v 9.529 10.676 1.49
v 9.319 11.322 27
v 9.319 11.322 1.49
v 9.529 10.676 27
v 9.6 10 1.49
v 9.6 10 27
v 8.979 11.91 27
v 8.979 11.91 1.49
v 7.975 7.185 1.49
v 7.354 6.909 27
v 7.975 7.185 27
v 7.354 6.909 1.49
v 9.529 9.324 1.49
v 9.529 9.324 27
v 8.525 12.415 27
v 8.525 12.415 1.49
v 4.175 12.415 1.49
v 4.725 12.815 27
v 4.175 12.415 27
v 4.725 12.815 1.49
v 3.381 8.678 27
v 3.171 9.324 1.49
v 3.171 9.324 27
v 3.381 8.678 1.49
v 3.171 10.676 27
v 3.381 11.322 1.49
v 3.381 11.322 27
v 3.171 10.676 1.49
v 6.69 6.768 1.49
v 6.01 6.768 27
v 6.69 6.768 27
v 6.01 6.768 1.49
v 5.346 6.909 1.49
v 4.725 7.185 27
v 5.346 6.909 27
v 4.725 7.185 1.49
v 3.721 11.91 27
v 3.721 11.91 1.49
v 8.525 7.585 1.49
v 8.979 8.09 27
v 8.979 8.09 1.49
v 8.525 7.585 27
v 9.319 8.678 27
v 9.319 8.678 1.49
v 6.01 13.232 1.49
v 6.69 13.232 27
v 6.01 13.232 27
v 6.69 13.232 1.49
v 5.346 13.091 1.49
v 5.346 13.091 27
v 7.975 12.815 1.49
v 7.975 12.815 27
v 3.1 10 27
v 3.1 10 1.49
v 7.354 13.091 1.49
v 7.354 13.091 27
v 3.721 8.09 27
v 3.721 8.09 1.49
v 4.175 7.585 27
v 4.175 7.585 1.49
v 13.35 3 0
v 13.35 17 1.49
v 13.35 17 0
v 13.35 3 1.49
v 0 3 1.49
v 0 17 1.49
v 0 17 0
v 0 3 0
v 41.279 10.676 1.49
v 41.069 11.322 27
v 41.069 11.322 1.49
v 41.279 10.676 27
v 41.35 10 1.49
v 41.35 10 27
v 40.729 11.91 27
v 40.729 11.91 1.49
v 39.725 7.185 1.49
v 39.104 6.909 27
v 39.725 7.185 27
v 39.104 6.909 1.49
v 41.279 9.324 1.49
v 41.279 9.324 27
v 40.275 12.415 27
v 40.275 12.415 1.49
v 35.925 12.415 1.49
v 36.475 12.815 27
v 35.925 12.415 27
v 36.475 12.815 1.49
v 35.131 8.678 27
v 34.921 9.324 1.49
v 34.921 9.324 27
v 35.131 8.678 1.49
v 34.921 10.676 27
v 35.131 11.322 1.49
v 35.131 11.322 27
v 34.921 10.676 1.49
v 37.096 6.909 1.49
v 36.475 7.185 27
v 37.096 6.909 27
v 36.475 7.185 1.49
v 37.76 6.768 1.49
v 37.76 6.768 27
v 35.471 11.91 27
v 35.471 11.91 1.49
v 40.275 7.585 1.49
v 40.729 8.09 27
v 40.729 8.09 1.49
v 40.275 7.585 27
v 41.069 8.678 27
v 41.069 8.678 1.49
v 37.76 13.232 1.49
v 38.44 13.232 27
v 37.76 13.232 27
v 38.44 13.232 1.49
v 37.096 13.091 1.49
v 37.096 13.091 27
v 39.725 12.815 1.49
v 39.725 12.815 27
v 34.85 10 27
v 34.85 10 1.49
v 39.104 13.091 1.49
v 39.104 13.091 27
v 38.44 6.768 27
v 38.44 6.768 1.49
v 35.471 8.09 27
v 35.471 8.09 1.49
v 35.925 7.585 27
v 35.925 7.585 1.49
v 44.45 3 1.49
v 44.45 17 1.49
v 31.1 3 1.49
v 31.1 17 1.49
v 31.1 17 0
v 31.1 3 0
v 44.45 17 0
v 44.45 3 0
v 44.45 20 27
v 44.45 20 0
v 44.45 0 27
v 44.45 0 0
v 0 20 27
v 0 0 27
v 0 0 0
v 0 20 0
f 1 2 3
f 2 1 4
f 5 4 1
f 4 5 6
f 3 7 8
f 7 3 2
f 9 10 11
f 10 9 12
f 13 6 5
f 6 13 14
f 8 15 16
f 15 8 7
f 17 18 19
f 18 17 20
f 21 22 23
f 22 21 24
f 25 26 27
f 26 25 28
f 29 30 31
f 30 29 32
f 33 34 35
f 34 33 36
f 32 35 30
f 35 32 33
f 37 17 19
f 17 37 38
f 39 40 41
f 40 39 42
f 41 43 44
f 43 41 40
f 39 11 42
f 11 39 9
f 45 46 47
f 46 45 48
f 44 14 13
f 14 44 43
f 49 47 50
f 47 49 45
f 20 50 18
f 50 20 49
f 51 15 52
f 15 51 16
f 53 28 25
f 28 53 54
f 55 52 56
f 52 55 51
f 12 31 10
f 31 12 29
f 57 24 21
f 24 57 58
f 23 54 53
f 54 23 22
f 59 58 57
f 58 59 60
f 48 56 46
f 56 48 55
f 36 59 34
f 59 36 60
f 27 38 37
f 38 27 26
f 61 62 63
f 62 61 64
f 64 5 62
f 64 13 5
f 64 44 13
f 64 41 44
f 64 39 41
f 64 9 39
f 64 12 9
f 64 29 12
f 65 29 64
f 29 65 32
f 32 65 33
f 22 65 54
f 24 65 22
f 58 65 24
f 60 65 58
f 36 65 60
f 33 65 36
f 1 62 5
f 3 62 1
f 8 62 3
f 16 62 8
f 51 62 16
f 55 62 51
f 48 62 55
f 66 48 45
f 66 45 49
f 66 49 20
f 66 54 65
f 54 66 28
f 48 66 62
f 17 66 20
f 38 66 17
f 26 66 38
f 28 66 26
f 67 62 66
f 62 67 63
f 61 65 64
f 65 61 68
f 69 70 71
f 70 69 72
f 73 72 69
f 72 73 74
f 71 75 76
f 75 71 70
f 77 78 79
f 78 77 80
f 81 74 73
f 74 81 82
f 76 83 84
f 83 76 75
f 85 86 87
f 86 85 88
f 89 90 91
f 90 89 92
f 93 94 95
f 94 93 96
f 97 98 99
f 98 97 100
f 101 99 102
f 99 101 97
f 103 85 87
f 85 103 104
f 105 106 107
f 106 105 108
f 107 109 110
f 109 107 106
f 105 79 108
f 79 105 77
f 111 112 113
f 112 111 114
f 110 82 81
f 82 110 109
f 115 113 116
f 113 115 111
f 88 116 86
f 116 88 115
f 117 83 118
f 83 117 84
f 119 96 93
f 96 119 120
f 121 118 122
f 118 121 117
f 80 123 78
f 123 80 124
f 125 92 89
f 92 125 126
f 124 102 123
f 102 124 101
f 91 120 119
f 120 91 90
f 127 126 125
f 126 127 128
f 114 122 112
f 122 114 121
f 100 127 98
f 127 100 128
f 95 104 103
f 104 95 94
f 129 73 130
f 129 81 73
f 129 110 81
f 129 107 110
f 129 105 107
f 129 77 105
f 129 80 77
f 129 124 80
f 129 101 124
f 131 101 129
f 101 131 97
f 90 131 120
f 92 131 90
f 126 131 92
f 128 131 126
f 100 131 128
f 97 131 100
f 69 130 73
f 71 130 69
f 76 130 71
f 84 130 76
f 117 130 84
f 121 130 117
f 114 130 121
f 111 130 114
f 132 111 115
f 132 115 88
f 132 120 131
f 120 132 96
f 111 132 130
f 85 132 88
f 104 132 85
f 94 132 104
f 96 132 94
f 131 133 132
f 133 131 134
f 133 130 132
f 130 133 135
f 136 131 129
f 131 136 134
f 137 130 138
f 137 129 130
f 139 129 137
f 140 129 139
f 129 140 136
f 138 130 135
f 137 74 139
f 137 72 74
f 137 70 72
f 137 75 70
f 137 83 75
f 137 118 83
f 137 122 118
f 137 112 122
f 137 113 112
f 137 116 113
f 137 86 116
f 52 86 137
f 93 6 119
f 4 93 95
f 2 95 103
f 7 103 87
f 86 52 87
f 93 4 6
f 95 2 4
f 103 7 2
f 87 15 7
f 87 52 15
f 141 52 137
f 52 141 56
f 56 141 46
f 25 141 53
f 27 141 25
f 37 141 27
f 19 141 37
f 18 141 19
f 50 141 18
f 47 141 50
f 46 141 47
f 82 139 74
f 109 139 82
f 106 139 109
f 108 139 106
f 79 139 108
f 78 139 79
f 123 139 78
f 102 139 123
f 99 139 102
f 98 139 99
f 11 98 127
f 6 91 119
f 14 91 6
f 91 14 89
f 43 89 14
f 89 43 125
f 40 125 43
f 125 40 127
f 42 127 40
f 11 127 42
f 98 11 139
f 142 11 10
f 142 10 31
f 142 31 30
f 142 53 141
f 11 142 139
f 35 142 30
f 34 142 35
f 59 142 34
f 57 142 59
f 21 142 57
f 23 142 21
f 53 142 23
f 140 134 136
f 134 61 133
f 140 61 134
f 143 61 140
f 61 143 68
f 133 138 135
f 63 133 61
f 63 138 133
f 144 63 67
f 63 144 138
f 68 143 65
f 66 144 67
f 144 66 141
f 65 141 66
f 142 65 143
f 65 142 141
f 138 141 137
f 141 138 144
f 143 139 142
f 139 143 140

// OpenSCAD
NUMBER_U_TO_COVER = 1;
HOLE_DIA = 6.5;
DEPTH = 27;
WIDTH = 20;
CAGE_NUT_FLANGE_DEPTH = 1.5;

HOLE_SPACING_1U = 31.75; // 1.25"
HEIGHT_1U = 44.45;

HEIGHT = HEIGHT_1U * NUMBER_U_TO_COVER; // 1U is 44.45 mm

tiny = 0.01;
$fn = 30;
holeOffset = (HEIGHT_1U - HOLE_SPACING_1U) / 2;

difference() {
  cube([HEIGHT, WIDTH, DEPTH]);
  HoleWithRecess(holeOffset);
  HoleWithRecess(HEIGHT - holeOffset);
}

module HoleWithRecess(offset) {
  translate([offset, WIDTH/2, -tiny]) {
    cylinder(d=HOLE_DIA,h=DEPTH+2*tiny);
    if (CAGE_NUT_FLANGE_DEPTH > 0) {
      cube([14,14,CAGE_NUT_FLANGE_DEPTH * 2], center=true);
    }
  }
};
